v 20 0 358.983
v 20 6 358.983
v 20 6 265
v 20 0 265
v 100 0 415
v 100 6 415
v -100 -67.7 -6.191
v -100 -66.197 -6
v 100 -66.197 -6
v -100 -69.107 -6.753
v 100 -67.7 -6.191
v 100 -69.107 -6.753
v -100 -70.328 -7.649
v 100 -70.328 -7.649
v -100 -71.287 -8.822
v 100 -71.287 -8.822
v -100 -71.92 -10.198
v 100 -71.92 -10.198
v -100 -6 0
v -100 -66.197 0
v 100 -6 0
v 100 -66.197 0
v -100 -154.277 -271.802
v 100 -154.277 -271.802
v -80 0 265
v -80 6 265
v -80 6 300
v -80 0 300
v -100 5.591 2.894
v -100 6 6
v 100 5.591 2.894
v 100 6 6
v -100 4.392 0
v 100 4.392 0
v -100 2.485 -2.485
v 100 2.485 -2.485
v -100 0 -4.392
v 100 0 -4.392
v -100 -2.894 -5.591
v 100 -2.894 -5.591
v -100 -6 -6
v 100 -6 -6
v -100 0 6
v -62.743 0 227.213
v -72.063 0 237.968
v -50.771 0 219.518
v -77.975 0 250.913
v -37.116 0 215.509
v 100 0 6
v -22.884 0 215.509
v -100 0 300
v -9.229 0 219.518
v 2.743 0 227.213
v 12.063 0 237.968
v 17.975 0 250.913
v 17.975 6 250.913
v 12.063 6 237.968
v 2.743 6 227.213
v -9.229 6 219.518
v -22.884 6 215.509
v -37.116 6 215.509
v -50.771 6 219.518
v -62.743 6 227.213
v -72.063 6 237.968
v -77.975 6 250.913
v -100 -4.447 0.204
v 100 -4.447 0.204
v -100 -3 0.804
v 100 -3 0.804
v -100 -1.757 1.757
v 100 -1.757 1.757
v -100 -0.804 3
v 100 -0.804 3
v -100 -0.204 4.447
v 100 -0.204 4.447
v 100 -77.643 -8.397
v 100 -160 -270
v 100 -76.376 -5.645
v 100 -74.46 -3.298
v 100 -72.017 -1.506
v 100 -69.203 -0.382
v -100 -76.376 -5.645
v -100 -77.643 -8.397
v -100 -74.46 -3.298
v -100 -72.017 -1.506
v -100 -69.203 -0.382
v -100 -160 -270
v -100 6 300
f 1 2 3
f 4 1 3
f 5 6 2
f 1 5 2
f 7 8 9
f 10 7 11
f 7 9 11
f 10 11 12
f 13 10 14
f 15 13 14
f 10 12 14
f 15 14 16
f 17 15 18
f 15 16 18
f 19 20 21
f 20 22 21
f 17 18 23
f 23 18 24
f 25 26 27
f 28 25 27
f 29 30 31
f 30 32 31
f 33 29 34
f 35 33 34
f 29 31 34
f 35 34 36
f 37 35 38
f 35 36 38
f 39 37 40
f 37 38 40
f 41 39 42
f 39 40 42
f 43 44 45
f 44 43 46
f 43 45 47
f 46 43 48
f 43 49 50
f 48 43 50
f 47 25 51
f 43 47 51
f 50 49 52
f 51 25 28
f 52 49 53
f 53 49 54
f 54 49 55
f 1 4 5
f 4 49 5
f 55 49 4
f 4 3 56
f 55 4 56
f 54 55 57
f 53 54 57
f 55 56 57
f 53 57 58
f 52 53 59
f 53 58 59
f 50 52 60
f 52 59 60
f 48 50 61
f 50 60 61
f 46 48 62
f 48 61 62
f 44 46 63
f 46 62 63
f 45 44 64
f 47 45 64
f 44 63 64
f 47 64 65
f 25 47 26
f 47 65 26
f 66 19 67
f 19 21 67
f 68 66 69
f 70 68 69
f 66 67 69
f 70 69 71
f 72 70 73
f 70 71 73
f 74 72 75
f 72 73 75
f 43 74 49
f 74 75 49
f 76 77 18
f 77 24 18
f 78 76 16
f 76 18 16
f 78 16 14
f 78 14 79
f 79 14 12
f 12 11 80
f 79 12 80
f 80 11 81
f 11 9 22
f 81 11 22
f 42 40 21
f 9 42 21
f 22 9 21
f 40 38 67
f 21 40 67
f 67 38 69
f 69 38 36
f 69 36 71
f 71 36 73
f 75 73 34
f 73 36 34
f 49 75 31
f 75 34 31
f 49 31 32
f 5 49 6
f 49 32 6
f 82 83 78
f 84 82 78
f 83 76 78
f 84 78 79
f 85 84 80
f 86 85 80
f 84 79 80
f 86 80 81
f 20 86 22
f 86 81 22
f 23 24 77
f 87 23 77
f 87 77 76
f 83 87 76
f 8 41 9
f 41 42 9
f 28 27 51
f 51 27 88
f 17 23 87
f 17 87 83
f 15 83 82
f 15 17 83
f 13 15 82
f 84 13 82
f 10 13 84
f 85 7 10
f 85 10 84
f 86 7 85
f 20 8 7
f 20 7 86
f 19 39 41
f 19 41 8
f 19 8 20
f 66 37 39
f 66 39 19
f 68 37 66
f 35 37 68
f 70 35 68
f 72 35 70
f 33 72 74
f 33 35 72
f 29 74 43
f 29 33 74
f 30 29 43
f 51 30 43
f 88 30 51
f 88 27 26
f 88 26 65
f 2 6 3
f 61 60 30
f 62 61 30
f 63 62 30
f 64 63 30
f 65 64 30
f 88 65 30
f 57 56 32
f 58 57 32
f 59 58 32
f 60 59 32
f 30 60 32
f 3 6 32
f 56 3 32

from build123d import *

# Parameters (mm, degrees)
SM_BASE_FLANGE_1_DEPTH = 100
CUT_EXTRUDE_1_DEPTH    = 459.018558576


# Sheet-metal steps are written as plain solids
with BuildPart() as part:
    # Sketch 1 → 基体-法兰1 (new, symmetric)
    with BuildSketch(Plane(origin=(0, 0, 0), x_dir=(0, 0, -1), z_dir=(1, 0, 0))):
        with BuildLine():
            Line((270, -160), (8.396569497, -77.643364471))
            ThreePointArc((8.396569497, -77.643364471), (2.324227007, -73.295019402), (0, -66.197173462))
            Line((0, -66.197173462), (0, -6))
            ThreePointArc((0, -6), (-1.757359313, -1.757359313), (-6, 0))
            Line((-6, 0), (-415, 0))
            Line((-415, 0), (-415, 6))
            Line((-415, 6), (-6, 6))
            ThreePointArc((-6, 6), (2.485281374, 2.485281374), (6, -6))
            Line((6, -6), (6, -66.197173462))
            ThreePointArc((6, -66.197173462), (7.162113503, -69.746096432), (10.198284749, -71.920268967))
            Line((10.198284749, -71.920268967), (271.801715251, -154.276904496))
            Line((271.801715251, -154.276904496), (270, -160))
        make_face()
    extrude(amount=SM_BASE_FLANGE_1_DEPTH, both=True)

    # 草图4 → 切除-拉伸1 (cut, through all)
    with BuildSketch(Plane(origin=(0, 6, 0), x_dir=(1, 0, 0), z_dir=(0, 1, 0))):
        with BuildLine():
            Line((100, -415), (20, -358.983396943))
            Line((20, -358.983396943), (20, -265))
            ThreePointArc((20, -265), (-30, -215), (-80, -265))
            Line((-80, -265), (-80, -300))
            Line((-80, -300), (-100, -300))
            Line((-100, -300), (-100, -415))
            Line((-100, -415), (100, -415))
        make_face()
    extrude(amount=-CUT_EXTRUDE_1_DEPTH, mode=Mode.SUBTRACT)


solid = part.part
